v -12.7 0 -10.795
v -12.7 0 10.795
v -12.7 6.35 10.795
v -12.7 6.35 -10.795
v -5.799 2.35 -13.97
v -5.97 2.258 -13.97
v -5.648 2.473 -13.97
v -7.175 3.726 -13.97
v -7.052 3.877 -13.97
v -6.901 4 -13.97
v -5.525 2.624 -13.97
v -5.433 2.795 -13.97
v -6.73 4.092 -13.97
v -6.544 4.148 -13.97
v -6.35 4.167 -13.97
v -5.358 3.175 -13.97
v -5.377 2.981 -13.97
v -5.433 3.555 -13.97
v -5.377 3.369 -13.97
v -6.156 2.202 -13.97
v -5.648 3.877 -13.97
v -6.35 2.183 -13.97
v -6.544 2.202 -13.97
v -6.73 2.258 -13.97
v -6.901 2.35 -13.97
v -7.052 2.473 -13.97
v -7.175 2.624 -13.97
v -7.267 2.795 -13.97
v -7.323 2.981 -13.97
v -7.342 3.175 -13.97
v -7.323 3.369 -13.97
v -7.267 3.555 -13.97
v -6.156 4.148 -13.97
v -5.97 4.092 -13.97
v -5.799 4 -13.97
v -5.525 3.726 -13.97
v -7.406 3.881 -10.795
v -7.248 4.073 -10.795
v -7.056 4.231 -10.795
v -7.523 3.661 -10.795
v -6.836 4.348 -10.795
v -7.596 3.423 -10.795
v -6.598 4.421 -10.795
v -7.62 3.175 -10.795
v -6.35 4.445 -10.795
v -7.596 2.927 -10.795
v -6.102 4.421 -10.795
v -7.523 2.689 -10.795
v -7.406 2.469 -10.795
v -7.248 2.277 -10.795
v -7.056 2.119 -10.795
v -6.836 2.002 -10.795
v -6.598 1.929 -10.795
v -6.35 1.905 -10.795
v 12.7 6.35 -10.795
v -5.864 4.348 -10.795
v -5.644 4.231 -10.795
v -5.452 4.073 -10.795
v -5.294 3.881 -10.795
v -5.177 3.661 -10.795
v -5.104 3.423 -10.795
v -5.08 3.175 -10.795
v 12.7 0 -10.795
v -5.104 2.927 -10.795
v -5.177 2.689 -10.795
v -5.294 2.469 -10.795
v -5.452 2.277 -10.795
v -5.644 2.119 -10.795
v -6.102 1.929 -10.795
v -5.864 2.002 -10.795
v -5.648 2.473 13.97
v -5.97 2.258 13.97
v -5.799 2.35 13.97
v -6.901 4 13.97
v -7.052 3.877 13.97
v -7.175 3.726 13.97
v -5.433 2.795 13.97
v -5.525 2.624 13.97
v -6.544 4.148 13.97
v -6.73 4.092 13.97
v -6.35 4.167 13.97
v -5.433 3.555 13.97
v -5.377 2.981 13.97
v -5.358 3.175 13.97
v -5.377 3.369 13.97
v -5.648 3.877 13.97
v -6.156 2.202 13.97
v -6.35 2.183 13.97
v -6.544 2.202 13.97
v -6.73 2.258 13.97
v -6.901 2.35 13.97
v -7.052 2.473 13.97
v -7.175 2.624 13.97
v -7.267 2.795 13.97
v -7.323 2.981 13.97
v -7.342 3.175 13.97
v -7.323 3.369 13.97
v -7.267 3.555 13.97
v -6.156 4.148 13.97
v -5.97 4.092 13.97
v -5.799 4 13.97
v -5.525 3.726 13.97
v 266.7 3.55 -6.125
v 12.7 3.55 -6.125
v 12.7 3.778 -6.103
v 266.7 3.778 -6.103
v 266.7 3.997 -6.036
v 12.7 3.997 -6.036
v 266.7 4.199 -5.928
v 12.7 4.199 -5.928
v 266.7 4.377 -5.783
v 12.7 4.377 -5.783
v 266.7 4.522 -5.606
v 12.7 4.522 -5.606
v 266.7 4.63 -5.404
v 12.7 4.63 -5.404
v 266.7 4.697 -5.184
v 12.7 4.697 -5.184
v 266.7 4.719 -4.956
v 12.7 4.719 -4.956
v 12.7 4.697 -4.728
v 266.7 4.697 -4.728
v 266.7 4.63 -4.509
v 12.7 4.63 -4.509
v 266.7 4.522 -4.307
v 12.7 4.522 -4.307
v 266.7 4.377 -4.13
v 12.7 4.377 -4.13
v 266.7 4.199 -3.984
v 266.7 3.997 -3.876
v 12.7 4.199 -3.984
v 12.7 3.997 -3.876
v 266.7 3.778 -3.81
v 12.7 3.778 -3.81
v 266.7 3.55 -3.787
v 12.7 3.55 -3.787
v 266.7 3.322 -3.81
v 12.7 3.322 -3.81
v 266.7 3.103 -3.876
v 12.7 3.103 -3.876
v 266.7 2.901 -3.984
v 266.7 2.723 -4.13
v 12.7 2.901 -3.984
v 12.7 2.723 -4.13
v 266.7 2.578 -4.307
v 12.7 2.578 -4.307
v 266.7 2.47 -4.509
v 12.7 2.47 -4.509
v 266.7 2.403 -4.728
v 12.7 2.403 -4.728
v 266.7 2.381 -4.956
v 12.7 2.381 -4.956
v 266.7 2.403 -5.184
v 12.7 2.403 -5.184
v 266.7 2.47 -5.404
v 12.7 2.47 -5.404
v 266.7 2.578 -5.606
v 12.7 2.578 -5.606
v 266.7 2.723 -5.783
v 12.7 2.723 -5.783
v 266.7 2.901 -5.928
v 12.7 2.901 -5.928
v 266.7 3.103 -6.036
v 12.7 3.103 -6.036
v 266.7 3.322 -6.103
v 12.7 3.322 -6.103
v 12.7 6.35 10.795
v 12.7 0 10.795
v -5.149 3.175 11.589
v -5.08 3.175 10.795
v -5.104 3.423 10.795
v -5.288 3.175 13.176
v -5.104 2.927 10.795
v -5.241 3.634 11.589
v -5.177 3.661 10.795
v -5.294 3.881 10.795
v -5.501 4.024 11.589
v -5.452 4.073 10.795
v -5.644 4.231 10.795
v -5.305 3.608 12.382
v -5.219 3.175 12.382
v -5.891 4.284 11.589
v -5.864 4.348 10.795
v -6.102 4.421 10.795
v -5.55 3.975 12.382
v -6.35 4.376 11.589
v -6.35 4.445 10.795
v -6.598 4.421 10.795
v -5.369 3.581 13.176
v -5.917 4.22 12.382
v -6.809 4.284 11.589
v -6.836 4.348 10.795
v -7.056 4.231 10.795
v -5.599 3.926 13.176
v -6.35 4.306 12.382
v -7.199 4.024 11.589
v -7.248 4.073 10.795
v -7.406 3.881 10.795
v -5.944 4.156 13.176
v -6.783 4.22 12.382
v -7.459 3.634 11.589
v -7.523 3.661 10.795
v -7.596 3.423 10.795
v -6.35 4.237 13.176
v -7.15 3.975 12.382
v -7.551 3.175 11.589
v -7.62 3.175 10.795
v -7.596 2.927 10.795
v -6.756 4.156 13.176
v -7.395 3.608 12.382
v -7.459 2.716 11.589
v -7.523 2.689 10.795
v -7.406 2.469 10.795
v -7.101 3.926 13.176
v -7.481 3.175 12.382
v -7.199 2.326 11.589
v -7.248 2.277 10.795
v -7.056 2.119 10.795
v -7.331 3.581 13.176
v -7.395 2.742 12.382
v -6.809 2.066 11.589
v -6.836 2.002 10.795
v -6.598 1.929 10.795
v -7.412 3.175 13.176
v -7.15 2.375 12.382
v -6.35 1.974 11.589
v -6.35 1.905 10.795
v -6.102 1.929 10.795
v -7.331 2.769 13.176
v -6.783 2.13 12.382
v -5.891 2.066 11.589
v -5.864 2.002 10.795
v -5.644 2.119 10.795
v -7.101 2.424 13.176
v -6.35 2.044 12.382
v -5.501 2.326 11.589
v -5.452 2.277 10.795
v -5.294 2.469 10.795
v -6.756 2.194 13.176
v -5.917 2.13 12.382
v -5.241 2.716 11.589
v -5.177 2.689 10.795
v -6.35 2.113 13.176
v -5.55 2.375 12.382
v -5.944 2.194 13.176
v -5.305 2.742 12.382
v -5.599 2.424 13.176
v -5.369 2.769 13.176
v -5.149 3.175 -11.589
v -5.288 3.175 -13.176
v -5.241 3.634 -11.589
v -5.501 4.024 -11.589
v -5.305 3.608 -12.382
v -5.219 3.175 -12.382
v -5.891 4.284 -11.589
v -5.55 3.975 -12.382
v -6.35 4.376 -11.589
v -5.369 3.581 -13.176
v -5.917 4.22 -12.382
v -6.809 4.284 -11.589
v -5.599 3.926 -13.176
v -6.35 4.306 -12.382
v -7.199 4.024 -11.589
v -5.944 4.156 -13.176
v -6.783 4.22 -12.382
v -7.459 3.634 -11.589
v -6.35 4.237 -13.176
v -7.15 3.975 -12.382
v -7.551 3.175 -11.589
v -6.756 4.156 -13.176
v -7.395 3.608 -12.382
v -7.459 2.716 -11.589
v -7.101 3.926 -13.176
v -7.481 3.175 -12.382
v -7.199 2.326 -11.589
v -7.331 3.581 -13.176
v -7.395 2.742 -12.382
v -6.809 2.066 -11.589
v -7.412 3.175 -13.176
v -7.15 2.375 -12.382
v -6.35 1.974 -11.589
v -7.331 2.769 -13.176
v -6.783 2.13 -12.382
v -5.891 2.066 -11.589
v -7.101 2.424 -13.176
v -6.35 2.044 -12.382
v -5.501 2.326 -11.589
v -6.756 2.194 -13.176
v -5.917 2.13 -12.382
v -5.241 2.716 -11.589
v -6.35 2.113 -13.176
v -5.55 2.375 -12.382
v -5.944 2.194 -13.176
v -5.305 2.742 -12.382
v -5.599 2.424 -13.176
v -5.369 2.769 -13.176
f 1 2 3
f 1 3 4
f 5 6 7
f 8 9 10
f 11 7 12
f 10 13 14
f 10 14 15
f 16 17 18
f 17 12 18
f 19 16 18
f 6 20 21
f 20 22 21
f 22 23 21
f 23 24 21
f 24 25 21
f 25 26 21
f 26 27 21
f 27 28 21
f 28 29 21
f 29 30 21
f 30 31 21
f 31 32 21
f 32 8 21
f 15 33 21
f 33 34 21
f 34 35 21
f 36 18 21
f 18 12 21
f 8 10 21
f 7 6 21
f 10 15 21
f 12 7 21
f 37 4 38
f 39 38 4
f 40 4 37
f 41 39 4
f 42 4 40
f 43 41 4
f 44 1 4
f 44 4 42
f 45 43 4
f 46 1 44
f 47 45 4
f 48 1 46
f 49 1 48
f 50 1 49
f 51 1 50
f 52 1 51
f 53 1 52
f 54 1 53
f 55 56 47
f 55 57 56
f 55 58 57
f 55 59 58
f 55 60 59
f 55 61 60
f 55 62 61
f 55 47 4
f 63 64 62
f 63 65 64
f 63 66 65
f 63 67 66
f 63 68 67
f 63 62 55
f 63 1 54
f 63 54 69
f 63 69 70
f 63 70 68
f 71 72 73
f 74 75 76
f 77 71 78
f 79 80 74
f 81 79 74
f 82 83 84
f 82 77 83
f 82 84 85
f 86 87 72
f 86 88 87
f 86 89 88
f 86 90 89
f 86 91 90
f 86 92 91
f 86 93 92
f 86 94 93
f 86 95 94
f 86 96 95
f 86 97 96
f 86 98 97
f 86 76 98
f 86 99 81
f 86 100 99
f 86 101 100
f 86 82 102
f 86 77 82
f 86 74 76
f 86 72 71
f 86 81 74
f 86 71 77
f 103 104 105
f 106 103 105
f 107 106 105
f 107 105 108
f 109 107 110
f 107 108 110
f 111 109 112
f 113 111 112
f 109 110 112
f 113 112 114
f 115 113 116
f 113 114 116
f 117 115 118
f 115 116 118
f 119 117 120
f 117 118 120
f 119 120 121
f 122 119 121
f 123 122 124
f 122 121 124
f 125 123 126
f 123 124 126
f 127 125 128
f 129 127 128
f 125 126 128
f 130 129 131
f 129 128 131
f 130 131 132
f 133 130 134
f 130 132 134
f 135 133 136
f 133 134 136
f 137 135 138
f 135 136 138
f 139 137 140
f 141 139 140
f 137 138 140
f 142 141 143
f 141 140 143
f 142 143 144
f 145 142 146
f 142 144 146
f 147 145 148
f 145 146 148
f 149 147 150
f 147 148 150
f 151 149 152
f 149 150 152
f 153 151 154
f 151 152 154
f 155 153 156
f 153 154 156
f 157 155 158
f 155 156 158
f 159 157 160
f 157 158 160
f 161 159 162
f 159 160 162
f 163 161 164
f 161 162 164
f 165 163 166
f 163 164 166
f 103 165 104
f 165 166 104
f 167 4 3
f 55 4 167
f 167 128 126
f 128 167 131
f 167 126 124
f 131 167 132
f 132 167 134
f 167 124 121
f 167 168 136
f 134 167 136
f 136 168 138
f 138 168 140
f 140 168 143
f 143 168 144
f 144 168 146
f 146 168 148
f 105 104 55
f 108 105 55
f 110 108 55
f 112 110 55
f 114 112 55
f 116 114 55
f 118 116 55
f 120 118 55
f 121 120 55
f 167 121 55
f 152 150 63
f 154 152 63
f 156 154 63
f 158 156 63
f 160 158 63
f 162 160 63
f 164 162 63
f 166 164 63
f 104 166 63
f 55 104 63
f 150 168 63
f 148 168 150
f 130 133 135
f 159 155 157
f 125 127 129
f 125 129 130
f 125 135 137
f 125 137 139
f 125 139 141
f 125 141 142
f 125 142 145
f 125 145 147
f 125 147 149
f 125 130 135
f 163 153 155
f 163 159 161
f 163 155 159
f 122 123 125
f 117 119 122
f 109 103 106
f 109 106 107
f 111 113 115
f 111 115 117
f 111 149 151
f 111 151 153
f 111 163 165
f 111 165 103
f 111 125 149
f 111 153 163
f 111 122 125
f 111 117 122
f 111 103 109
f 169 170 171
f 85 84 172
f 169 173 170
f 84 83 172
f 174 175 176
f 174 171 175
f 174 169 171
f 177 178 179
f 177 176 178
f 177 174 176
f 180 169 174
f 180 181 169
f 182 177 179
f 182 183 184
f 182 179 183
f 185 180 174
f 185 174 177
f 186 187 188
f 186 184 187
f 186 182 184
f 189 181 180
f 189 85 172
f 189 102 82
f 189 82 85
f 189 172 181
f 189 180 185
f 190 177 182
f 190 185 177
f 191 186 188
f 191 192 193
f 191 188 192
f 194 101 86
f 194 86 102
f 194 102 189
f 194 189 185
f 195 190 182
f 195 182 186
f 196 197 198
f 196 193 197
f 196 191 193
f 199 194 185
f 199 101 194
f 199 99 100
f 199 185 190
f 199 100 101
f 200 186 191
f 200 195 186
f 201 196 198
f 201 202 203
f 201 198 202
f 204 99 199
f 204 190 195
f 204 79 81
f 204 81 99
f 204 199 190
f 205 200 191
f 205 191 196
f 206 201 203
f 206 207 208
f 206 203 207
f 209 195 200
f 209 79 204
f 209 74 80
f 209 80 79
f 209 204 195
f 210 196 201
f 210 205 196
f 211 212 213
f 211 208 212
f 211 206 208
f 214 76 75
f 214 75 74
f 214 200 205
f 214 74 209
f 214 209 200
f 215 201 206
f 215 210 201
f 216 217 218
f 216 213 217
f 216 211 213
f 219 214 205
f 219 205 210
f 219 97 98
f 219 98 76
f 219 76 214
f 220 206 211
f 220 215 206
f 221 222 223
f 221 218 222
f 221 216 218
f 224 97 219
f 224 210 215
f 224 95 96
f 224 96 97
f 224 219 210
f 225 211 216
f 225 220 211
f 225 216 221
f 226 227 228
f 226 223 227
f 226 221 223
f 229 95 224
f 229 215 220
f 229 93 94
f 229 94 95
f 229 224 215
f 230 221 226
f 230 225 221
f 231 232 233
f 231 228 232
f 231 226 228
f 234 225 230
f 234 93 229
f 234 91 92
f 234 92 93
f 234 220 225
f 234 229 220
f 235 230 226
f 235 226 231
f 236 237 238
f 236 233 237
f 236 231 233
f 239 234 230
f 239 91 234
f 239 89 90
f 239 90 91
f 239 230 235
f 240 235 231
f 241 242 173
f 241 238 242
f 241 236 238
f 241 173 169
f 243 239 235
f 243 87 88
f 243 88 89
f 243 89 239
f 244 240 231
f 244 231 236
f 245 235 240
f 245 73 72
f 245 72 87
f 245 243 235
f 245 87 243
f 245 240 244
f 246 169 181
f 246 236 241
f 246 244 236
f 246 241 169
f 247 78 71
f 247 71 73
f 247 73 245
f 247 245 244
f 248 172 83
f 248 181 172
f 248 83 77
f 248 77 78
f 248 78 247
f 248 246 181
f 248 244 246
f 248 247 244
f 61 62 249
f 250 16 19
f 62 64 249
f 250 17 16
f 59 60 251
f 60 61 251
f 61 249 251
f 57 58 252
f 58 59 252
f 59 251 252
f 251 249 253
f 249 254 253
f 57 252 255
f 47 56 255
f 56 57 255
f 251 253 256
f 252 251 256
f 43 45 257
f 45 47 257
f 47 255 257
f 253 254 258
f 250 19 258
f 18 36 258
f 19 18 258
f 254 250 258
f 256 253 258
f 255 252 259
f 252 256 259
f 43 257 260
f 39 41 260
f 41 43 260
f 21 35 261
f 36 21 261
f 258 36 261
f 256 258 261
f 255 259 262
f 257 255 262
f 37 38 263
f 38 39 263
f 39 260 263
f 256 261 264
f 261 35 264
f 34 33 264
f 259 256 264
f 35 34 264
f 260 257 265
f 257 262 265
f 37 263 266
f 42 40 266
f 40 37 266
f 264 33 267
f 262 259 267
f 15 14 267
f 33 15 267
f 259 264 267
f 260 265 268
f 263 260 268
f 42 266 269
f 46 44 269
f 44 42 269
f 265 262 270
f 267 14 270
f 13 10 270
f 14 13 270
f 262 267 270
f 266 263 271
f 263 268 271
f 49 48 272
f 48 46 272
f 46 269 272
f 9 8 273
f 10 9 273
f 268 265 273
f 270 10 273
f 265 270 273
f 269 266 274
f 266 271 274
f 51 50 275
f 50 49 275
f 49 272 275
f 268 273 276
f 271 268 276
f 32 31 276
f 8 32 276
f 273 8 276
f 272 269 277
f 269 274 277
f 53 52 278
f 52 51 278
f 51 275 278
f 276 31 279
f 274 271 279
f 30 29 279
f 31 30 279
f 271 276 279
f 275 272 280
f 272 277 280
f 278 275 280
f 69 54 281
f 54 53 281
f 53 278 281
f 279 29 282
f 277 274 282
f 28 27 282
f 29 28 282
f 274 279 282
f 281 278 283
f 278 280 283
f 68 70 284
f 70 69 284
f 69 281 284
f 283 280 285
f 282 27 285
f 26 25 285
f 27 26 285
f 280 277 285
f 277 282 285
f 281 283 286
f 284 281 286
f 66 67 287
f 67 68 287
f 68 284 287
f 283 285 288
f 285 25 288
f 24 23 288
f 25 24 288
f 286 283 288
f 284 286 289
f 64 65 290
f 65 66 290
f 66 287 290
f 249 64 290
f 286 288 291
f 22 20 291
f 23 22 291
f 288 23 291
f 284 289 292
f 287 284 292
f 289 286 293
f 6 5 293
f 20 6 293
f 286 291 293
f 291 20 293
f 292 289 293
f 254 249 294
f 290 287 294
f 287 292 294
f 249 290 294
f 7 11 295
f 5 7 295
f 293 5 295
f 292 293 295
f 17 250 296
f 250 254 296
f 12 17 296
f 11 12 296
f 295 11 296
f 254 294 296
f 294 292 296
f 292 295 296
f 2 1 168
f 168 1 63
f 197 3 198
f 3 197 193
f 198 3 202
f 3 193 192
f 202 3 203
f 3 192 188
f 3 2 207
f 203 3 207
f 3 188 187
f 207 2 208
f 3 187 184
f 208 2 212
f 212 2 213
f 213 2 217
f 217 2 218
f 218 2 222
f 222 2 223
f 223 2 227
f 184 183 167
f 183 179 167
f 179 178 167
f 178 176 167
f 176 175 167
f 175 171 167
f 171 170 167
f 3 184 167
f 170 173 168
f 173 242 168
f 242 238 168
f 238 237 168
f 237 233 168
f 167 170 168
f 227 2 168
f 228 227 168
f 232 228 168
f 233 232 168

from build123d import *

# Parameters (mm, degrees)
SKETCH1_W           = 25.4
SKETCH1_H           = 21.59
BOSS_EXTRUDE1_DEPTH = 6.35
SKETCH2_R           = 1.27
BOSS_EXTRUDE2_DEPTH = 3.175
BOSS_EXTRUDE2_TAPER = 5
SKETCH3_R           = 1.169045739
BOSS_EXTRUDE3_DEPTH = 254


with BuildPart() as part:
    # Sketch1 → Boss-Extrude1 (new body)
    with BuildSketch(Plane(origin=(0, 0, 0), x_dir=(1, 0, 0), z_dir=(0, 1, 0))):
        Rectangle(SKETCH1_W, SKETCH1_H)
    extrude(amount=BOSS_EXTRUDE1_DEPTH)

    # Sketch2 → Boss-Extrude2 (add)
    with BuildSketch(Plane.XY.offset(10.795)):
        with Locations((-6.35, 3.175)):
            Circle(SKETCH2_R)
    boss_extrude2 = extrude(amount=BOSS_EXTRUDE2_DEPTH, taper=BOSS_EXTRUDE2_TAPER)

    # Mirror1: Boss-Extrude2 across plane
    add(boss_extrude2.mirror(Plane.XY))

    # Sketch3 → Boss-Extrude3 (add)
    with BuildSketch(Plane(origin=(12.7, 0, 0), x_dir=(0, 0, -1), z_dir=(1, 0, 0))):
        with Locations((4.956387533, 3.55)):
            Circle(SKETCH3_R)
    extrude(amount=BOSS_EXTRUDE3_DEPTH)


solid = part.part
